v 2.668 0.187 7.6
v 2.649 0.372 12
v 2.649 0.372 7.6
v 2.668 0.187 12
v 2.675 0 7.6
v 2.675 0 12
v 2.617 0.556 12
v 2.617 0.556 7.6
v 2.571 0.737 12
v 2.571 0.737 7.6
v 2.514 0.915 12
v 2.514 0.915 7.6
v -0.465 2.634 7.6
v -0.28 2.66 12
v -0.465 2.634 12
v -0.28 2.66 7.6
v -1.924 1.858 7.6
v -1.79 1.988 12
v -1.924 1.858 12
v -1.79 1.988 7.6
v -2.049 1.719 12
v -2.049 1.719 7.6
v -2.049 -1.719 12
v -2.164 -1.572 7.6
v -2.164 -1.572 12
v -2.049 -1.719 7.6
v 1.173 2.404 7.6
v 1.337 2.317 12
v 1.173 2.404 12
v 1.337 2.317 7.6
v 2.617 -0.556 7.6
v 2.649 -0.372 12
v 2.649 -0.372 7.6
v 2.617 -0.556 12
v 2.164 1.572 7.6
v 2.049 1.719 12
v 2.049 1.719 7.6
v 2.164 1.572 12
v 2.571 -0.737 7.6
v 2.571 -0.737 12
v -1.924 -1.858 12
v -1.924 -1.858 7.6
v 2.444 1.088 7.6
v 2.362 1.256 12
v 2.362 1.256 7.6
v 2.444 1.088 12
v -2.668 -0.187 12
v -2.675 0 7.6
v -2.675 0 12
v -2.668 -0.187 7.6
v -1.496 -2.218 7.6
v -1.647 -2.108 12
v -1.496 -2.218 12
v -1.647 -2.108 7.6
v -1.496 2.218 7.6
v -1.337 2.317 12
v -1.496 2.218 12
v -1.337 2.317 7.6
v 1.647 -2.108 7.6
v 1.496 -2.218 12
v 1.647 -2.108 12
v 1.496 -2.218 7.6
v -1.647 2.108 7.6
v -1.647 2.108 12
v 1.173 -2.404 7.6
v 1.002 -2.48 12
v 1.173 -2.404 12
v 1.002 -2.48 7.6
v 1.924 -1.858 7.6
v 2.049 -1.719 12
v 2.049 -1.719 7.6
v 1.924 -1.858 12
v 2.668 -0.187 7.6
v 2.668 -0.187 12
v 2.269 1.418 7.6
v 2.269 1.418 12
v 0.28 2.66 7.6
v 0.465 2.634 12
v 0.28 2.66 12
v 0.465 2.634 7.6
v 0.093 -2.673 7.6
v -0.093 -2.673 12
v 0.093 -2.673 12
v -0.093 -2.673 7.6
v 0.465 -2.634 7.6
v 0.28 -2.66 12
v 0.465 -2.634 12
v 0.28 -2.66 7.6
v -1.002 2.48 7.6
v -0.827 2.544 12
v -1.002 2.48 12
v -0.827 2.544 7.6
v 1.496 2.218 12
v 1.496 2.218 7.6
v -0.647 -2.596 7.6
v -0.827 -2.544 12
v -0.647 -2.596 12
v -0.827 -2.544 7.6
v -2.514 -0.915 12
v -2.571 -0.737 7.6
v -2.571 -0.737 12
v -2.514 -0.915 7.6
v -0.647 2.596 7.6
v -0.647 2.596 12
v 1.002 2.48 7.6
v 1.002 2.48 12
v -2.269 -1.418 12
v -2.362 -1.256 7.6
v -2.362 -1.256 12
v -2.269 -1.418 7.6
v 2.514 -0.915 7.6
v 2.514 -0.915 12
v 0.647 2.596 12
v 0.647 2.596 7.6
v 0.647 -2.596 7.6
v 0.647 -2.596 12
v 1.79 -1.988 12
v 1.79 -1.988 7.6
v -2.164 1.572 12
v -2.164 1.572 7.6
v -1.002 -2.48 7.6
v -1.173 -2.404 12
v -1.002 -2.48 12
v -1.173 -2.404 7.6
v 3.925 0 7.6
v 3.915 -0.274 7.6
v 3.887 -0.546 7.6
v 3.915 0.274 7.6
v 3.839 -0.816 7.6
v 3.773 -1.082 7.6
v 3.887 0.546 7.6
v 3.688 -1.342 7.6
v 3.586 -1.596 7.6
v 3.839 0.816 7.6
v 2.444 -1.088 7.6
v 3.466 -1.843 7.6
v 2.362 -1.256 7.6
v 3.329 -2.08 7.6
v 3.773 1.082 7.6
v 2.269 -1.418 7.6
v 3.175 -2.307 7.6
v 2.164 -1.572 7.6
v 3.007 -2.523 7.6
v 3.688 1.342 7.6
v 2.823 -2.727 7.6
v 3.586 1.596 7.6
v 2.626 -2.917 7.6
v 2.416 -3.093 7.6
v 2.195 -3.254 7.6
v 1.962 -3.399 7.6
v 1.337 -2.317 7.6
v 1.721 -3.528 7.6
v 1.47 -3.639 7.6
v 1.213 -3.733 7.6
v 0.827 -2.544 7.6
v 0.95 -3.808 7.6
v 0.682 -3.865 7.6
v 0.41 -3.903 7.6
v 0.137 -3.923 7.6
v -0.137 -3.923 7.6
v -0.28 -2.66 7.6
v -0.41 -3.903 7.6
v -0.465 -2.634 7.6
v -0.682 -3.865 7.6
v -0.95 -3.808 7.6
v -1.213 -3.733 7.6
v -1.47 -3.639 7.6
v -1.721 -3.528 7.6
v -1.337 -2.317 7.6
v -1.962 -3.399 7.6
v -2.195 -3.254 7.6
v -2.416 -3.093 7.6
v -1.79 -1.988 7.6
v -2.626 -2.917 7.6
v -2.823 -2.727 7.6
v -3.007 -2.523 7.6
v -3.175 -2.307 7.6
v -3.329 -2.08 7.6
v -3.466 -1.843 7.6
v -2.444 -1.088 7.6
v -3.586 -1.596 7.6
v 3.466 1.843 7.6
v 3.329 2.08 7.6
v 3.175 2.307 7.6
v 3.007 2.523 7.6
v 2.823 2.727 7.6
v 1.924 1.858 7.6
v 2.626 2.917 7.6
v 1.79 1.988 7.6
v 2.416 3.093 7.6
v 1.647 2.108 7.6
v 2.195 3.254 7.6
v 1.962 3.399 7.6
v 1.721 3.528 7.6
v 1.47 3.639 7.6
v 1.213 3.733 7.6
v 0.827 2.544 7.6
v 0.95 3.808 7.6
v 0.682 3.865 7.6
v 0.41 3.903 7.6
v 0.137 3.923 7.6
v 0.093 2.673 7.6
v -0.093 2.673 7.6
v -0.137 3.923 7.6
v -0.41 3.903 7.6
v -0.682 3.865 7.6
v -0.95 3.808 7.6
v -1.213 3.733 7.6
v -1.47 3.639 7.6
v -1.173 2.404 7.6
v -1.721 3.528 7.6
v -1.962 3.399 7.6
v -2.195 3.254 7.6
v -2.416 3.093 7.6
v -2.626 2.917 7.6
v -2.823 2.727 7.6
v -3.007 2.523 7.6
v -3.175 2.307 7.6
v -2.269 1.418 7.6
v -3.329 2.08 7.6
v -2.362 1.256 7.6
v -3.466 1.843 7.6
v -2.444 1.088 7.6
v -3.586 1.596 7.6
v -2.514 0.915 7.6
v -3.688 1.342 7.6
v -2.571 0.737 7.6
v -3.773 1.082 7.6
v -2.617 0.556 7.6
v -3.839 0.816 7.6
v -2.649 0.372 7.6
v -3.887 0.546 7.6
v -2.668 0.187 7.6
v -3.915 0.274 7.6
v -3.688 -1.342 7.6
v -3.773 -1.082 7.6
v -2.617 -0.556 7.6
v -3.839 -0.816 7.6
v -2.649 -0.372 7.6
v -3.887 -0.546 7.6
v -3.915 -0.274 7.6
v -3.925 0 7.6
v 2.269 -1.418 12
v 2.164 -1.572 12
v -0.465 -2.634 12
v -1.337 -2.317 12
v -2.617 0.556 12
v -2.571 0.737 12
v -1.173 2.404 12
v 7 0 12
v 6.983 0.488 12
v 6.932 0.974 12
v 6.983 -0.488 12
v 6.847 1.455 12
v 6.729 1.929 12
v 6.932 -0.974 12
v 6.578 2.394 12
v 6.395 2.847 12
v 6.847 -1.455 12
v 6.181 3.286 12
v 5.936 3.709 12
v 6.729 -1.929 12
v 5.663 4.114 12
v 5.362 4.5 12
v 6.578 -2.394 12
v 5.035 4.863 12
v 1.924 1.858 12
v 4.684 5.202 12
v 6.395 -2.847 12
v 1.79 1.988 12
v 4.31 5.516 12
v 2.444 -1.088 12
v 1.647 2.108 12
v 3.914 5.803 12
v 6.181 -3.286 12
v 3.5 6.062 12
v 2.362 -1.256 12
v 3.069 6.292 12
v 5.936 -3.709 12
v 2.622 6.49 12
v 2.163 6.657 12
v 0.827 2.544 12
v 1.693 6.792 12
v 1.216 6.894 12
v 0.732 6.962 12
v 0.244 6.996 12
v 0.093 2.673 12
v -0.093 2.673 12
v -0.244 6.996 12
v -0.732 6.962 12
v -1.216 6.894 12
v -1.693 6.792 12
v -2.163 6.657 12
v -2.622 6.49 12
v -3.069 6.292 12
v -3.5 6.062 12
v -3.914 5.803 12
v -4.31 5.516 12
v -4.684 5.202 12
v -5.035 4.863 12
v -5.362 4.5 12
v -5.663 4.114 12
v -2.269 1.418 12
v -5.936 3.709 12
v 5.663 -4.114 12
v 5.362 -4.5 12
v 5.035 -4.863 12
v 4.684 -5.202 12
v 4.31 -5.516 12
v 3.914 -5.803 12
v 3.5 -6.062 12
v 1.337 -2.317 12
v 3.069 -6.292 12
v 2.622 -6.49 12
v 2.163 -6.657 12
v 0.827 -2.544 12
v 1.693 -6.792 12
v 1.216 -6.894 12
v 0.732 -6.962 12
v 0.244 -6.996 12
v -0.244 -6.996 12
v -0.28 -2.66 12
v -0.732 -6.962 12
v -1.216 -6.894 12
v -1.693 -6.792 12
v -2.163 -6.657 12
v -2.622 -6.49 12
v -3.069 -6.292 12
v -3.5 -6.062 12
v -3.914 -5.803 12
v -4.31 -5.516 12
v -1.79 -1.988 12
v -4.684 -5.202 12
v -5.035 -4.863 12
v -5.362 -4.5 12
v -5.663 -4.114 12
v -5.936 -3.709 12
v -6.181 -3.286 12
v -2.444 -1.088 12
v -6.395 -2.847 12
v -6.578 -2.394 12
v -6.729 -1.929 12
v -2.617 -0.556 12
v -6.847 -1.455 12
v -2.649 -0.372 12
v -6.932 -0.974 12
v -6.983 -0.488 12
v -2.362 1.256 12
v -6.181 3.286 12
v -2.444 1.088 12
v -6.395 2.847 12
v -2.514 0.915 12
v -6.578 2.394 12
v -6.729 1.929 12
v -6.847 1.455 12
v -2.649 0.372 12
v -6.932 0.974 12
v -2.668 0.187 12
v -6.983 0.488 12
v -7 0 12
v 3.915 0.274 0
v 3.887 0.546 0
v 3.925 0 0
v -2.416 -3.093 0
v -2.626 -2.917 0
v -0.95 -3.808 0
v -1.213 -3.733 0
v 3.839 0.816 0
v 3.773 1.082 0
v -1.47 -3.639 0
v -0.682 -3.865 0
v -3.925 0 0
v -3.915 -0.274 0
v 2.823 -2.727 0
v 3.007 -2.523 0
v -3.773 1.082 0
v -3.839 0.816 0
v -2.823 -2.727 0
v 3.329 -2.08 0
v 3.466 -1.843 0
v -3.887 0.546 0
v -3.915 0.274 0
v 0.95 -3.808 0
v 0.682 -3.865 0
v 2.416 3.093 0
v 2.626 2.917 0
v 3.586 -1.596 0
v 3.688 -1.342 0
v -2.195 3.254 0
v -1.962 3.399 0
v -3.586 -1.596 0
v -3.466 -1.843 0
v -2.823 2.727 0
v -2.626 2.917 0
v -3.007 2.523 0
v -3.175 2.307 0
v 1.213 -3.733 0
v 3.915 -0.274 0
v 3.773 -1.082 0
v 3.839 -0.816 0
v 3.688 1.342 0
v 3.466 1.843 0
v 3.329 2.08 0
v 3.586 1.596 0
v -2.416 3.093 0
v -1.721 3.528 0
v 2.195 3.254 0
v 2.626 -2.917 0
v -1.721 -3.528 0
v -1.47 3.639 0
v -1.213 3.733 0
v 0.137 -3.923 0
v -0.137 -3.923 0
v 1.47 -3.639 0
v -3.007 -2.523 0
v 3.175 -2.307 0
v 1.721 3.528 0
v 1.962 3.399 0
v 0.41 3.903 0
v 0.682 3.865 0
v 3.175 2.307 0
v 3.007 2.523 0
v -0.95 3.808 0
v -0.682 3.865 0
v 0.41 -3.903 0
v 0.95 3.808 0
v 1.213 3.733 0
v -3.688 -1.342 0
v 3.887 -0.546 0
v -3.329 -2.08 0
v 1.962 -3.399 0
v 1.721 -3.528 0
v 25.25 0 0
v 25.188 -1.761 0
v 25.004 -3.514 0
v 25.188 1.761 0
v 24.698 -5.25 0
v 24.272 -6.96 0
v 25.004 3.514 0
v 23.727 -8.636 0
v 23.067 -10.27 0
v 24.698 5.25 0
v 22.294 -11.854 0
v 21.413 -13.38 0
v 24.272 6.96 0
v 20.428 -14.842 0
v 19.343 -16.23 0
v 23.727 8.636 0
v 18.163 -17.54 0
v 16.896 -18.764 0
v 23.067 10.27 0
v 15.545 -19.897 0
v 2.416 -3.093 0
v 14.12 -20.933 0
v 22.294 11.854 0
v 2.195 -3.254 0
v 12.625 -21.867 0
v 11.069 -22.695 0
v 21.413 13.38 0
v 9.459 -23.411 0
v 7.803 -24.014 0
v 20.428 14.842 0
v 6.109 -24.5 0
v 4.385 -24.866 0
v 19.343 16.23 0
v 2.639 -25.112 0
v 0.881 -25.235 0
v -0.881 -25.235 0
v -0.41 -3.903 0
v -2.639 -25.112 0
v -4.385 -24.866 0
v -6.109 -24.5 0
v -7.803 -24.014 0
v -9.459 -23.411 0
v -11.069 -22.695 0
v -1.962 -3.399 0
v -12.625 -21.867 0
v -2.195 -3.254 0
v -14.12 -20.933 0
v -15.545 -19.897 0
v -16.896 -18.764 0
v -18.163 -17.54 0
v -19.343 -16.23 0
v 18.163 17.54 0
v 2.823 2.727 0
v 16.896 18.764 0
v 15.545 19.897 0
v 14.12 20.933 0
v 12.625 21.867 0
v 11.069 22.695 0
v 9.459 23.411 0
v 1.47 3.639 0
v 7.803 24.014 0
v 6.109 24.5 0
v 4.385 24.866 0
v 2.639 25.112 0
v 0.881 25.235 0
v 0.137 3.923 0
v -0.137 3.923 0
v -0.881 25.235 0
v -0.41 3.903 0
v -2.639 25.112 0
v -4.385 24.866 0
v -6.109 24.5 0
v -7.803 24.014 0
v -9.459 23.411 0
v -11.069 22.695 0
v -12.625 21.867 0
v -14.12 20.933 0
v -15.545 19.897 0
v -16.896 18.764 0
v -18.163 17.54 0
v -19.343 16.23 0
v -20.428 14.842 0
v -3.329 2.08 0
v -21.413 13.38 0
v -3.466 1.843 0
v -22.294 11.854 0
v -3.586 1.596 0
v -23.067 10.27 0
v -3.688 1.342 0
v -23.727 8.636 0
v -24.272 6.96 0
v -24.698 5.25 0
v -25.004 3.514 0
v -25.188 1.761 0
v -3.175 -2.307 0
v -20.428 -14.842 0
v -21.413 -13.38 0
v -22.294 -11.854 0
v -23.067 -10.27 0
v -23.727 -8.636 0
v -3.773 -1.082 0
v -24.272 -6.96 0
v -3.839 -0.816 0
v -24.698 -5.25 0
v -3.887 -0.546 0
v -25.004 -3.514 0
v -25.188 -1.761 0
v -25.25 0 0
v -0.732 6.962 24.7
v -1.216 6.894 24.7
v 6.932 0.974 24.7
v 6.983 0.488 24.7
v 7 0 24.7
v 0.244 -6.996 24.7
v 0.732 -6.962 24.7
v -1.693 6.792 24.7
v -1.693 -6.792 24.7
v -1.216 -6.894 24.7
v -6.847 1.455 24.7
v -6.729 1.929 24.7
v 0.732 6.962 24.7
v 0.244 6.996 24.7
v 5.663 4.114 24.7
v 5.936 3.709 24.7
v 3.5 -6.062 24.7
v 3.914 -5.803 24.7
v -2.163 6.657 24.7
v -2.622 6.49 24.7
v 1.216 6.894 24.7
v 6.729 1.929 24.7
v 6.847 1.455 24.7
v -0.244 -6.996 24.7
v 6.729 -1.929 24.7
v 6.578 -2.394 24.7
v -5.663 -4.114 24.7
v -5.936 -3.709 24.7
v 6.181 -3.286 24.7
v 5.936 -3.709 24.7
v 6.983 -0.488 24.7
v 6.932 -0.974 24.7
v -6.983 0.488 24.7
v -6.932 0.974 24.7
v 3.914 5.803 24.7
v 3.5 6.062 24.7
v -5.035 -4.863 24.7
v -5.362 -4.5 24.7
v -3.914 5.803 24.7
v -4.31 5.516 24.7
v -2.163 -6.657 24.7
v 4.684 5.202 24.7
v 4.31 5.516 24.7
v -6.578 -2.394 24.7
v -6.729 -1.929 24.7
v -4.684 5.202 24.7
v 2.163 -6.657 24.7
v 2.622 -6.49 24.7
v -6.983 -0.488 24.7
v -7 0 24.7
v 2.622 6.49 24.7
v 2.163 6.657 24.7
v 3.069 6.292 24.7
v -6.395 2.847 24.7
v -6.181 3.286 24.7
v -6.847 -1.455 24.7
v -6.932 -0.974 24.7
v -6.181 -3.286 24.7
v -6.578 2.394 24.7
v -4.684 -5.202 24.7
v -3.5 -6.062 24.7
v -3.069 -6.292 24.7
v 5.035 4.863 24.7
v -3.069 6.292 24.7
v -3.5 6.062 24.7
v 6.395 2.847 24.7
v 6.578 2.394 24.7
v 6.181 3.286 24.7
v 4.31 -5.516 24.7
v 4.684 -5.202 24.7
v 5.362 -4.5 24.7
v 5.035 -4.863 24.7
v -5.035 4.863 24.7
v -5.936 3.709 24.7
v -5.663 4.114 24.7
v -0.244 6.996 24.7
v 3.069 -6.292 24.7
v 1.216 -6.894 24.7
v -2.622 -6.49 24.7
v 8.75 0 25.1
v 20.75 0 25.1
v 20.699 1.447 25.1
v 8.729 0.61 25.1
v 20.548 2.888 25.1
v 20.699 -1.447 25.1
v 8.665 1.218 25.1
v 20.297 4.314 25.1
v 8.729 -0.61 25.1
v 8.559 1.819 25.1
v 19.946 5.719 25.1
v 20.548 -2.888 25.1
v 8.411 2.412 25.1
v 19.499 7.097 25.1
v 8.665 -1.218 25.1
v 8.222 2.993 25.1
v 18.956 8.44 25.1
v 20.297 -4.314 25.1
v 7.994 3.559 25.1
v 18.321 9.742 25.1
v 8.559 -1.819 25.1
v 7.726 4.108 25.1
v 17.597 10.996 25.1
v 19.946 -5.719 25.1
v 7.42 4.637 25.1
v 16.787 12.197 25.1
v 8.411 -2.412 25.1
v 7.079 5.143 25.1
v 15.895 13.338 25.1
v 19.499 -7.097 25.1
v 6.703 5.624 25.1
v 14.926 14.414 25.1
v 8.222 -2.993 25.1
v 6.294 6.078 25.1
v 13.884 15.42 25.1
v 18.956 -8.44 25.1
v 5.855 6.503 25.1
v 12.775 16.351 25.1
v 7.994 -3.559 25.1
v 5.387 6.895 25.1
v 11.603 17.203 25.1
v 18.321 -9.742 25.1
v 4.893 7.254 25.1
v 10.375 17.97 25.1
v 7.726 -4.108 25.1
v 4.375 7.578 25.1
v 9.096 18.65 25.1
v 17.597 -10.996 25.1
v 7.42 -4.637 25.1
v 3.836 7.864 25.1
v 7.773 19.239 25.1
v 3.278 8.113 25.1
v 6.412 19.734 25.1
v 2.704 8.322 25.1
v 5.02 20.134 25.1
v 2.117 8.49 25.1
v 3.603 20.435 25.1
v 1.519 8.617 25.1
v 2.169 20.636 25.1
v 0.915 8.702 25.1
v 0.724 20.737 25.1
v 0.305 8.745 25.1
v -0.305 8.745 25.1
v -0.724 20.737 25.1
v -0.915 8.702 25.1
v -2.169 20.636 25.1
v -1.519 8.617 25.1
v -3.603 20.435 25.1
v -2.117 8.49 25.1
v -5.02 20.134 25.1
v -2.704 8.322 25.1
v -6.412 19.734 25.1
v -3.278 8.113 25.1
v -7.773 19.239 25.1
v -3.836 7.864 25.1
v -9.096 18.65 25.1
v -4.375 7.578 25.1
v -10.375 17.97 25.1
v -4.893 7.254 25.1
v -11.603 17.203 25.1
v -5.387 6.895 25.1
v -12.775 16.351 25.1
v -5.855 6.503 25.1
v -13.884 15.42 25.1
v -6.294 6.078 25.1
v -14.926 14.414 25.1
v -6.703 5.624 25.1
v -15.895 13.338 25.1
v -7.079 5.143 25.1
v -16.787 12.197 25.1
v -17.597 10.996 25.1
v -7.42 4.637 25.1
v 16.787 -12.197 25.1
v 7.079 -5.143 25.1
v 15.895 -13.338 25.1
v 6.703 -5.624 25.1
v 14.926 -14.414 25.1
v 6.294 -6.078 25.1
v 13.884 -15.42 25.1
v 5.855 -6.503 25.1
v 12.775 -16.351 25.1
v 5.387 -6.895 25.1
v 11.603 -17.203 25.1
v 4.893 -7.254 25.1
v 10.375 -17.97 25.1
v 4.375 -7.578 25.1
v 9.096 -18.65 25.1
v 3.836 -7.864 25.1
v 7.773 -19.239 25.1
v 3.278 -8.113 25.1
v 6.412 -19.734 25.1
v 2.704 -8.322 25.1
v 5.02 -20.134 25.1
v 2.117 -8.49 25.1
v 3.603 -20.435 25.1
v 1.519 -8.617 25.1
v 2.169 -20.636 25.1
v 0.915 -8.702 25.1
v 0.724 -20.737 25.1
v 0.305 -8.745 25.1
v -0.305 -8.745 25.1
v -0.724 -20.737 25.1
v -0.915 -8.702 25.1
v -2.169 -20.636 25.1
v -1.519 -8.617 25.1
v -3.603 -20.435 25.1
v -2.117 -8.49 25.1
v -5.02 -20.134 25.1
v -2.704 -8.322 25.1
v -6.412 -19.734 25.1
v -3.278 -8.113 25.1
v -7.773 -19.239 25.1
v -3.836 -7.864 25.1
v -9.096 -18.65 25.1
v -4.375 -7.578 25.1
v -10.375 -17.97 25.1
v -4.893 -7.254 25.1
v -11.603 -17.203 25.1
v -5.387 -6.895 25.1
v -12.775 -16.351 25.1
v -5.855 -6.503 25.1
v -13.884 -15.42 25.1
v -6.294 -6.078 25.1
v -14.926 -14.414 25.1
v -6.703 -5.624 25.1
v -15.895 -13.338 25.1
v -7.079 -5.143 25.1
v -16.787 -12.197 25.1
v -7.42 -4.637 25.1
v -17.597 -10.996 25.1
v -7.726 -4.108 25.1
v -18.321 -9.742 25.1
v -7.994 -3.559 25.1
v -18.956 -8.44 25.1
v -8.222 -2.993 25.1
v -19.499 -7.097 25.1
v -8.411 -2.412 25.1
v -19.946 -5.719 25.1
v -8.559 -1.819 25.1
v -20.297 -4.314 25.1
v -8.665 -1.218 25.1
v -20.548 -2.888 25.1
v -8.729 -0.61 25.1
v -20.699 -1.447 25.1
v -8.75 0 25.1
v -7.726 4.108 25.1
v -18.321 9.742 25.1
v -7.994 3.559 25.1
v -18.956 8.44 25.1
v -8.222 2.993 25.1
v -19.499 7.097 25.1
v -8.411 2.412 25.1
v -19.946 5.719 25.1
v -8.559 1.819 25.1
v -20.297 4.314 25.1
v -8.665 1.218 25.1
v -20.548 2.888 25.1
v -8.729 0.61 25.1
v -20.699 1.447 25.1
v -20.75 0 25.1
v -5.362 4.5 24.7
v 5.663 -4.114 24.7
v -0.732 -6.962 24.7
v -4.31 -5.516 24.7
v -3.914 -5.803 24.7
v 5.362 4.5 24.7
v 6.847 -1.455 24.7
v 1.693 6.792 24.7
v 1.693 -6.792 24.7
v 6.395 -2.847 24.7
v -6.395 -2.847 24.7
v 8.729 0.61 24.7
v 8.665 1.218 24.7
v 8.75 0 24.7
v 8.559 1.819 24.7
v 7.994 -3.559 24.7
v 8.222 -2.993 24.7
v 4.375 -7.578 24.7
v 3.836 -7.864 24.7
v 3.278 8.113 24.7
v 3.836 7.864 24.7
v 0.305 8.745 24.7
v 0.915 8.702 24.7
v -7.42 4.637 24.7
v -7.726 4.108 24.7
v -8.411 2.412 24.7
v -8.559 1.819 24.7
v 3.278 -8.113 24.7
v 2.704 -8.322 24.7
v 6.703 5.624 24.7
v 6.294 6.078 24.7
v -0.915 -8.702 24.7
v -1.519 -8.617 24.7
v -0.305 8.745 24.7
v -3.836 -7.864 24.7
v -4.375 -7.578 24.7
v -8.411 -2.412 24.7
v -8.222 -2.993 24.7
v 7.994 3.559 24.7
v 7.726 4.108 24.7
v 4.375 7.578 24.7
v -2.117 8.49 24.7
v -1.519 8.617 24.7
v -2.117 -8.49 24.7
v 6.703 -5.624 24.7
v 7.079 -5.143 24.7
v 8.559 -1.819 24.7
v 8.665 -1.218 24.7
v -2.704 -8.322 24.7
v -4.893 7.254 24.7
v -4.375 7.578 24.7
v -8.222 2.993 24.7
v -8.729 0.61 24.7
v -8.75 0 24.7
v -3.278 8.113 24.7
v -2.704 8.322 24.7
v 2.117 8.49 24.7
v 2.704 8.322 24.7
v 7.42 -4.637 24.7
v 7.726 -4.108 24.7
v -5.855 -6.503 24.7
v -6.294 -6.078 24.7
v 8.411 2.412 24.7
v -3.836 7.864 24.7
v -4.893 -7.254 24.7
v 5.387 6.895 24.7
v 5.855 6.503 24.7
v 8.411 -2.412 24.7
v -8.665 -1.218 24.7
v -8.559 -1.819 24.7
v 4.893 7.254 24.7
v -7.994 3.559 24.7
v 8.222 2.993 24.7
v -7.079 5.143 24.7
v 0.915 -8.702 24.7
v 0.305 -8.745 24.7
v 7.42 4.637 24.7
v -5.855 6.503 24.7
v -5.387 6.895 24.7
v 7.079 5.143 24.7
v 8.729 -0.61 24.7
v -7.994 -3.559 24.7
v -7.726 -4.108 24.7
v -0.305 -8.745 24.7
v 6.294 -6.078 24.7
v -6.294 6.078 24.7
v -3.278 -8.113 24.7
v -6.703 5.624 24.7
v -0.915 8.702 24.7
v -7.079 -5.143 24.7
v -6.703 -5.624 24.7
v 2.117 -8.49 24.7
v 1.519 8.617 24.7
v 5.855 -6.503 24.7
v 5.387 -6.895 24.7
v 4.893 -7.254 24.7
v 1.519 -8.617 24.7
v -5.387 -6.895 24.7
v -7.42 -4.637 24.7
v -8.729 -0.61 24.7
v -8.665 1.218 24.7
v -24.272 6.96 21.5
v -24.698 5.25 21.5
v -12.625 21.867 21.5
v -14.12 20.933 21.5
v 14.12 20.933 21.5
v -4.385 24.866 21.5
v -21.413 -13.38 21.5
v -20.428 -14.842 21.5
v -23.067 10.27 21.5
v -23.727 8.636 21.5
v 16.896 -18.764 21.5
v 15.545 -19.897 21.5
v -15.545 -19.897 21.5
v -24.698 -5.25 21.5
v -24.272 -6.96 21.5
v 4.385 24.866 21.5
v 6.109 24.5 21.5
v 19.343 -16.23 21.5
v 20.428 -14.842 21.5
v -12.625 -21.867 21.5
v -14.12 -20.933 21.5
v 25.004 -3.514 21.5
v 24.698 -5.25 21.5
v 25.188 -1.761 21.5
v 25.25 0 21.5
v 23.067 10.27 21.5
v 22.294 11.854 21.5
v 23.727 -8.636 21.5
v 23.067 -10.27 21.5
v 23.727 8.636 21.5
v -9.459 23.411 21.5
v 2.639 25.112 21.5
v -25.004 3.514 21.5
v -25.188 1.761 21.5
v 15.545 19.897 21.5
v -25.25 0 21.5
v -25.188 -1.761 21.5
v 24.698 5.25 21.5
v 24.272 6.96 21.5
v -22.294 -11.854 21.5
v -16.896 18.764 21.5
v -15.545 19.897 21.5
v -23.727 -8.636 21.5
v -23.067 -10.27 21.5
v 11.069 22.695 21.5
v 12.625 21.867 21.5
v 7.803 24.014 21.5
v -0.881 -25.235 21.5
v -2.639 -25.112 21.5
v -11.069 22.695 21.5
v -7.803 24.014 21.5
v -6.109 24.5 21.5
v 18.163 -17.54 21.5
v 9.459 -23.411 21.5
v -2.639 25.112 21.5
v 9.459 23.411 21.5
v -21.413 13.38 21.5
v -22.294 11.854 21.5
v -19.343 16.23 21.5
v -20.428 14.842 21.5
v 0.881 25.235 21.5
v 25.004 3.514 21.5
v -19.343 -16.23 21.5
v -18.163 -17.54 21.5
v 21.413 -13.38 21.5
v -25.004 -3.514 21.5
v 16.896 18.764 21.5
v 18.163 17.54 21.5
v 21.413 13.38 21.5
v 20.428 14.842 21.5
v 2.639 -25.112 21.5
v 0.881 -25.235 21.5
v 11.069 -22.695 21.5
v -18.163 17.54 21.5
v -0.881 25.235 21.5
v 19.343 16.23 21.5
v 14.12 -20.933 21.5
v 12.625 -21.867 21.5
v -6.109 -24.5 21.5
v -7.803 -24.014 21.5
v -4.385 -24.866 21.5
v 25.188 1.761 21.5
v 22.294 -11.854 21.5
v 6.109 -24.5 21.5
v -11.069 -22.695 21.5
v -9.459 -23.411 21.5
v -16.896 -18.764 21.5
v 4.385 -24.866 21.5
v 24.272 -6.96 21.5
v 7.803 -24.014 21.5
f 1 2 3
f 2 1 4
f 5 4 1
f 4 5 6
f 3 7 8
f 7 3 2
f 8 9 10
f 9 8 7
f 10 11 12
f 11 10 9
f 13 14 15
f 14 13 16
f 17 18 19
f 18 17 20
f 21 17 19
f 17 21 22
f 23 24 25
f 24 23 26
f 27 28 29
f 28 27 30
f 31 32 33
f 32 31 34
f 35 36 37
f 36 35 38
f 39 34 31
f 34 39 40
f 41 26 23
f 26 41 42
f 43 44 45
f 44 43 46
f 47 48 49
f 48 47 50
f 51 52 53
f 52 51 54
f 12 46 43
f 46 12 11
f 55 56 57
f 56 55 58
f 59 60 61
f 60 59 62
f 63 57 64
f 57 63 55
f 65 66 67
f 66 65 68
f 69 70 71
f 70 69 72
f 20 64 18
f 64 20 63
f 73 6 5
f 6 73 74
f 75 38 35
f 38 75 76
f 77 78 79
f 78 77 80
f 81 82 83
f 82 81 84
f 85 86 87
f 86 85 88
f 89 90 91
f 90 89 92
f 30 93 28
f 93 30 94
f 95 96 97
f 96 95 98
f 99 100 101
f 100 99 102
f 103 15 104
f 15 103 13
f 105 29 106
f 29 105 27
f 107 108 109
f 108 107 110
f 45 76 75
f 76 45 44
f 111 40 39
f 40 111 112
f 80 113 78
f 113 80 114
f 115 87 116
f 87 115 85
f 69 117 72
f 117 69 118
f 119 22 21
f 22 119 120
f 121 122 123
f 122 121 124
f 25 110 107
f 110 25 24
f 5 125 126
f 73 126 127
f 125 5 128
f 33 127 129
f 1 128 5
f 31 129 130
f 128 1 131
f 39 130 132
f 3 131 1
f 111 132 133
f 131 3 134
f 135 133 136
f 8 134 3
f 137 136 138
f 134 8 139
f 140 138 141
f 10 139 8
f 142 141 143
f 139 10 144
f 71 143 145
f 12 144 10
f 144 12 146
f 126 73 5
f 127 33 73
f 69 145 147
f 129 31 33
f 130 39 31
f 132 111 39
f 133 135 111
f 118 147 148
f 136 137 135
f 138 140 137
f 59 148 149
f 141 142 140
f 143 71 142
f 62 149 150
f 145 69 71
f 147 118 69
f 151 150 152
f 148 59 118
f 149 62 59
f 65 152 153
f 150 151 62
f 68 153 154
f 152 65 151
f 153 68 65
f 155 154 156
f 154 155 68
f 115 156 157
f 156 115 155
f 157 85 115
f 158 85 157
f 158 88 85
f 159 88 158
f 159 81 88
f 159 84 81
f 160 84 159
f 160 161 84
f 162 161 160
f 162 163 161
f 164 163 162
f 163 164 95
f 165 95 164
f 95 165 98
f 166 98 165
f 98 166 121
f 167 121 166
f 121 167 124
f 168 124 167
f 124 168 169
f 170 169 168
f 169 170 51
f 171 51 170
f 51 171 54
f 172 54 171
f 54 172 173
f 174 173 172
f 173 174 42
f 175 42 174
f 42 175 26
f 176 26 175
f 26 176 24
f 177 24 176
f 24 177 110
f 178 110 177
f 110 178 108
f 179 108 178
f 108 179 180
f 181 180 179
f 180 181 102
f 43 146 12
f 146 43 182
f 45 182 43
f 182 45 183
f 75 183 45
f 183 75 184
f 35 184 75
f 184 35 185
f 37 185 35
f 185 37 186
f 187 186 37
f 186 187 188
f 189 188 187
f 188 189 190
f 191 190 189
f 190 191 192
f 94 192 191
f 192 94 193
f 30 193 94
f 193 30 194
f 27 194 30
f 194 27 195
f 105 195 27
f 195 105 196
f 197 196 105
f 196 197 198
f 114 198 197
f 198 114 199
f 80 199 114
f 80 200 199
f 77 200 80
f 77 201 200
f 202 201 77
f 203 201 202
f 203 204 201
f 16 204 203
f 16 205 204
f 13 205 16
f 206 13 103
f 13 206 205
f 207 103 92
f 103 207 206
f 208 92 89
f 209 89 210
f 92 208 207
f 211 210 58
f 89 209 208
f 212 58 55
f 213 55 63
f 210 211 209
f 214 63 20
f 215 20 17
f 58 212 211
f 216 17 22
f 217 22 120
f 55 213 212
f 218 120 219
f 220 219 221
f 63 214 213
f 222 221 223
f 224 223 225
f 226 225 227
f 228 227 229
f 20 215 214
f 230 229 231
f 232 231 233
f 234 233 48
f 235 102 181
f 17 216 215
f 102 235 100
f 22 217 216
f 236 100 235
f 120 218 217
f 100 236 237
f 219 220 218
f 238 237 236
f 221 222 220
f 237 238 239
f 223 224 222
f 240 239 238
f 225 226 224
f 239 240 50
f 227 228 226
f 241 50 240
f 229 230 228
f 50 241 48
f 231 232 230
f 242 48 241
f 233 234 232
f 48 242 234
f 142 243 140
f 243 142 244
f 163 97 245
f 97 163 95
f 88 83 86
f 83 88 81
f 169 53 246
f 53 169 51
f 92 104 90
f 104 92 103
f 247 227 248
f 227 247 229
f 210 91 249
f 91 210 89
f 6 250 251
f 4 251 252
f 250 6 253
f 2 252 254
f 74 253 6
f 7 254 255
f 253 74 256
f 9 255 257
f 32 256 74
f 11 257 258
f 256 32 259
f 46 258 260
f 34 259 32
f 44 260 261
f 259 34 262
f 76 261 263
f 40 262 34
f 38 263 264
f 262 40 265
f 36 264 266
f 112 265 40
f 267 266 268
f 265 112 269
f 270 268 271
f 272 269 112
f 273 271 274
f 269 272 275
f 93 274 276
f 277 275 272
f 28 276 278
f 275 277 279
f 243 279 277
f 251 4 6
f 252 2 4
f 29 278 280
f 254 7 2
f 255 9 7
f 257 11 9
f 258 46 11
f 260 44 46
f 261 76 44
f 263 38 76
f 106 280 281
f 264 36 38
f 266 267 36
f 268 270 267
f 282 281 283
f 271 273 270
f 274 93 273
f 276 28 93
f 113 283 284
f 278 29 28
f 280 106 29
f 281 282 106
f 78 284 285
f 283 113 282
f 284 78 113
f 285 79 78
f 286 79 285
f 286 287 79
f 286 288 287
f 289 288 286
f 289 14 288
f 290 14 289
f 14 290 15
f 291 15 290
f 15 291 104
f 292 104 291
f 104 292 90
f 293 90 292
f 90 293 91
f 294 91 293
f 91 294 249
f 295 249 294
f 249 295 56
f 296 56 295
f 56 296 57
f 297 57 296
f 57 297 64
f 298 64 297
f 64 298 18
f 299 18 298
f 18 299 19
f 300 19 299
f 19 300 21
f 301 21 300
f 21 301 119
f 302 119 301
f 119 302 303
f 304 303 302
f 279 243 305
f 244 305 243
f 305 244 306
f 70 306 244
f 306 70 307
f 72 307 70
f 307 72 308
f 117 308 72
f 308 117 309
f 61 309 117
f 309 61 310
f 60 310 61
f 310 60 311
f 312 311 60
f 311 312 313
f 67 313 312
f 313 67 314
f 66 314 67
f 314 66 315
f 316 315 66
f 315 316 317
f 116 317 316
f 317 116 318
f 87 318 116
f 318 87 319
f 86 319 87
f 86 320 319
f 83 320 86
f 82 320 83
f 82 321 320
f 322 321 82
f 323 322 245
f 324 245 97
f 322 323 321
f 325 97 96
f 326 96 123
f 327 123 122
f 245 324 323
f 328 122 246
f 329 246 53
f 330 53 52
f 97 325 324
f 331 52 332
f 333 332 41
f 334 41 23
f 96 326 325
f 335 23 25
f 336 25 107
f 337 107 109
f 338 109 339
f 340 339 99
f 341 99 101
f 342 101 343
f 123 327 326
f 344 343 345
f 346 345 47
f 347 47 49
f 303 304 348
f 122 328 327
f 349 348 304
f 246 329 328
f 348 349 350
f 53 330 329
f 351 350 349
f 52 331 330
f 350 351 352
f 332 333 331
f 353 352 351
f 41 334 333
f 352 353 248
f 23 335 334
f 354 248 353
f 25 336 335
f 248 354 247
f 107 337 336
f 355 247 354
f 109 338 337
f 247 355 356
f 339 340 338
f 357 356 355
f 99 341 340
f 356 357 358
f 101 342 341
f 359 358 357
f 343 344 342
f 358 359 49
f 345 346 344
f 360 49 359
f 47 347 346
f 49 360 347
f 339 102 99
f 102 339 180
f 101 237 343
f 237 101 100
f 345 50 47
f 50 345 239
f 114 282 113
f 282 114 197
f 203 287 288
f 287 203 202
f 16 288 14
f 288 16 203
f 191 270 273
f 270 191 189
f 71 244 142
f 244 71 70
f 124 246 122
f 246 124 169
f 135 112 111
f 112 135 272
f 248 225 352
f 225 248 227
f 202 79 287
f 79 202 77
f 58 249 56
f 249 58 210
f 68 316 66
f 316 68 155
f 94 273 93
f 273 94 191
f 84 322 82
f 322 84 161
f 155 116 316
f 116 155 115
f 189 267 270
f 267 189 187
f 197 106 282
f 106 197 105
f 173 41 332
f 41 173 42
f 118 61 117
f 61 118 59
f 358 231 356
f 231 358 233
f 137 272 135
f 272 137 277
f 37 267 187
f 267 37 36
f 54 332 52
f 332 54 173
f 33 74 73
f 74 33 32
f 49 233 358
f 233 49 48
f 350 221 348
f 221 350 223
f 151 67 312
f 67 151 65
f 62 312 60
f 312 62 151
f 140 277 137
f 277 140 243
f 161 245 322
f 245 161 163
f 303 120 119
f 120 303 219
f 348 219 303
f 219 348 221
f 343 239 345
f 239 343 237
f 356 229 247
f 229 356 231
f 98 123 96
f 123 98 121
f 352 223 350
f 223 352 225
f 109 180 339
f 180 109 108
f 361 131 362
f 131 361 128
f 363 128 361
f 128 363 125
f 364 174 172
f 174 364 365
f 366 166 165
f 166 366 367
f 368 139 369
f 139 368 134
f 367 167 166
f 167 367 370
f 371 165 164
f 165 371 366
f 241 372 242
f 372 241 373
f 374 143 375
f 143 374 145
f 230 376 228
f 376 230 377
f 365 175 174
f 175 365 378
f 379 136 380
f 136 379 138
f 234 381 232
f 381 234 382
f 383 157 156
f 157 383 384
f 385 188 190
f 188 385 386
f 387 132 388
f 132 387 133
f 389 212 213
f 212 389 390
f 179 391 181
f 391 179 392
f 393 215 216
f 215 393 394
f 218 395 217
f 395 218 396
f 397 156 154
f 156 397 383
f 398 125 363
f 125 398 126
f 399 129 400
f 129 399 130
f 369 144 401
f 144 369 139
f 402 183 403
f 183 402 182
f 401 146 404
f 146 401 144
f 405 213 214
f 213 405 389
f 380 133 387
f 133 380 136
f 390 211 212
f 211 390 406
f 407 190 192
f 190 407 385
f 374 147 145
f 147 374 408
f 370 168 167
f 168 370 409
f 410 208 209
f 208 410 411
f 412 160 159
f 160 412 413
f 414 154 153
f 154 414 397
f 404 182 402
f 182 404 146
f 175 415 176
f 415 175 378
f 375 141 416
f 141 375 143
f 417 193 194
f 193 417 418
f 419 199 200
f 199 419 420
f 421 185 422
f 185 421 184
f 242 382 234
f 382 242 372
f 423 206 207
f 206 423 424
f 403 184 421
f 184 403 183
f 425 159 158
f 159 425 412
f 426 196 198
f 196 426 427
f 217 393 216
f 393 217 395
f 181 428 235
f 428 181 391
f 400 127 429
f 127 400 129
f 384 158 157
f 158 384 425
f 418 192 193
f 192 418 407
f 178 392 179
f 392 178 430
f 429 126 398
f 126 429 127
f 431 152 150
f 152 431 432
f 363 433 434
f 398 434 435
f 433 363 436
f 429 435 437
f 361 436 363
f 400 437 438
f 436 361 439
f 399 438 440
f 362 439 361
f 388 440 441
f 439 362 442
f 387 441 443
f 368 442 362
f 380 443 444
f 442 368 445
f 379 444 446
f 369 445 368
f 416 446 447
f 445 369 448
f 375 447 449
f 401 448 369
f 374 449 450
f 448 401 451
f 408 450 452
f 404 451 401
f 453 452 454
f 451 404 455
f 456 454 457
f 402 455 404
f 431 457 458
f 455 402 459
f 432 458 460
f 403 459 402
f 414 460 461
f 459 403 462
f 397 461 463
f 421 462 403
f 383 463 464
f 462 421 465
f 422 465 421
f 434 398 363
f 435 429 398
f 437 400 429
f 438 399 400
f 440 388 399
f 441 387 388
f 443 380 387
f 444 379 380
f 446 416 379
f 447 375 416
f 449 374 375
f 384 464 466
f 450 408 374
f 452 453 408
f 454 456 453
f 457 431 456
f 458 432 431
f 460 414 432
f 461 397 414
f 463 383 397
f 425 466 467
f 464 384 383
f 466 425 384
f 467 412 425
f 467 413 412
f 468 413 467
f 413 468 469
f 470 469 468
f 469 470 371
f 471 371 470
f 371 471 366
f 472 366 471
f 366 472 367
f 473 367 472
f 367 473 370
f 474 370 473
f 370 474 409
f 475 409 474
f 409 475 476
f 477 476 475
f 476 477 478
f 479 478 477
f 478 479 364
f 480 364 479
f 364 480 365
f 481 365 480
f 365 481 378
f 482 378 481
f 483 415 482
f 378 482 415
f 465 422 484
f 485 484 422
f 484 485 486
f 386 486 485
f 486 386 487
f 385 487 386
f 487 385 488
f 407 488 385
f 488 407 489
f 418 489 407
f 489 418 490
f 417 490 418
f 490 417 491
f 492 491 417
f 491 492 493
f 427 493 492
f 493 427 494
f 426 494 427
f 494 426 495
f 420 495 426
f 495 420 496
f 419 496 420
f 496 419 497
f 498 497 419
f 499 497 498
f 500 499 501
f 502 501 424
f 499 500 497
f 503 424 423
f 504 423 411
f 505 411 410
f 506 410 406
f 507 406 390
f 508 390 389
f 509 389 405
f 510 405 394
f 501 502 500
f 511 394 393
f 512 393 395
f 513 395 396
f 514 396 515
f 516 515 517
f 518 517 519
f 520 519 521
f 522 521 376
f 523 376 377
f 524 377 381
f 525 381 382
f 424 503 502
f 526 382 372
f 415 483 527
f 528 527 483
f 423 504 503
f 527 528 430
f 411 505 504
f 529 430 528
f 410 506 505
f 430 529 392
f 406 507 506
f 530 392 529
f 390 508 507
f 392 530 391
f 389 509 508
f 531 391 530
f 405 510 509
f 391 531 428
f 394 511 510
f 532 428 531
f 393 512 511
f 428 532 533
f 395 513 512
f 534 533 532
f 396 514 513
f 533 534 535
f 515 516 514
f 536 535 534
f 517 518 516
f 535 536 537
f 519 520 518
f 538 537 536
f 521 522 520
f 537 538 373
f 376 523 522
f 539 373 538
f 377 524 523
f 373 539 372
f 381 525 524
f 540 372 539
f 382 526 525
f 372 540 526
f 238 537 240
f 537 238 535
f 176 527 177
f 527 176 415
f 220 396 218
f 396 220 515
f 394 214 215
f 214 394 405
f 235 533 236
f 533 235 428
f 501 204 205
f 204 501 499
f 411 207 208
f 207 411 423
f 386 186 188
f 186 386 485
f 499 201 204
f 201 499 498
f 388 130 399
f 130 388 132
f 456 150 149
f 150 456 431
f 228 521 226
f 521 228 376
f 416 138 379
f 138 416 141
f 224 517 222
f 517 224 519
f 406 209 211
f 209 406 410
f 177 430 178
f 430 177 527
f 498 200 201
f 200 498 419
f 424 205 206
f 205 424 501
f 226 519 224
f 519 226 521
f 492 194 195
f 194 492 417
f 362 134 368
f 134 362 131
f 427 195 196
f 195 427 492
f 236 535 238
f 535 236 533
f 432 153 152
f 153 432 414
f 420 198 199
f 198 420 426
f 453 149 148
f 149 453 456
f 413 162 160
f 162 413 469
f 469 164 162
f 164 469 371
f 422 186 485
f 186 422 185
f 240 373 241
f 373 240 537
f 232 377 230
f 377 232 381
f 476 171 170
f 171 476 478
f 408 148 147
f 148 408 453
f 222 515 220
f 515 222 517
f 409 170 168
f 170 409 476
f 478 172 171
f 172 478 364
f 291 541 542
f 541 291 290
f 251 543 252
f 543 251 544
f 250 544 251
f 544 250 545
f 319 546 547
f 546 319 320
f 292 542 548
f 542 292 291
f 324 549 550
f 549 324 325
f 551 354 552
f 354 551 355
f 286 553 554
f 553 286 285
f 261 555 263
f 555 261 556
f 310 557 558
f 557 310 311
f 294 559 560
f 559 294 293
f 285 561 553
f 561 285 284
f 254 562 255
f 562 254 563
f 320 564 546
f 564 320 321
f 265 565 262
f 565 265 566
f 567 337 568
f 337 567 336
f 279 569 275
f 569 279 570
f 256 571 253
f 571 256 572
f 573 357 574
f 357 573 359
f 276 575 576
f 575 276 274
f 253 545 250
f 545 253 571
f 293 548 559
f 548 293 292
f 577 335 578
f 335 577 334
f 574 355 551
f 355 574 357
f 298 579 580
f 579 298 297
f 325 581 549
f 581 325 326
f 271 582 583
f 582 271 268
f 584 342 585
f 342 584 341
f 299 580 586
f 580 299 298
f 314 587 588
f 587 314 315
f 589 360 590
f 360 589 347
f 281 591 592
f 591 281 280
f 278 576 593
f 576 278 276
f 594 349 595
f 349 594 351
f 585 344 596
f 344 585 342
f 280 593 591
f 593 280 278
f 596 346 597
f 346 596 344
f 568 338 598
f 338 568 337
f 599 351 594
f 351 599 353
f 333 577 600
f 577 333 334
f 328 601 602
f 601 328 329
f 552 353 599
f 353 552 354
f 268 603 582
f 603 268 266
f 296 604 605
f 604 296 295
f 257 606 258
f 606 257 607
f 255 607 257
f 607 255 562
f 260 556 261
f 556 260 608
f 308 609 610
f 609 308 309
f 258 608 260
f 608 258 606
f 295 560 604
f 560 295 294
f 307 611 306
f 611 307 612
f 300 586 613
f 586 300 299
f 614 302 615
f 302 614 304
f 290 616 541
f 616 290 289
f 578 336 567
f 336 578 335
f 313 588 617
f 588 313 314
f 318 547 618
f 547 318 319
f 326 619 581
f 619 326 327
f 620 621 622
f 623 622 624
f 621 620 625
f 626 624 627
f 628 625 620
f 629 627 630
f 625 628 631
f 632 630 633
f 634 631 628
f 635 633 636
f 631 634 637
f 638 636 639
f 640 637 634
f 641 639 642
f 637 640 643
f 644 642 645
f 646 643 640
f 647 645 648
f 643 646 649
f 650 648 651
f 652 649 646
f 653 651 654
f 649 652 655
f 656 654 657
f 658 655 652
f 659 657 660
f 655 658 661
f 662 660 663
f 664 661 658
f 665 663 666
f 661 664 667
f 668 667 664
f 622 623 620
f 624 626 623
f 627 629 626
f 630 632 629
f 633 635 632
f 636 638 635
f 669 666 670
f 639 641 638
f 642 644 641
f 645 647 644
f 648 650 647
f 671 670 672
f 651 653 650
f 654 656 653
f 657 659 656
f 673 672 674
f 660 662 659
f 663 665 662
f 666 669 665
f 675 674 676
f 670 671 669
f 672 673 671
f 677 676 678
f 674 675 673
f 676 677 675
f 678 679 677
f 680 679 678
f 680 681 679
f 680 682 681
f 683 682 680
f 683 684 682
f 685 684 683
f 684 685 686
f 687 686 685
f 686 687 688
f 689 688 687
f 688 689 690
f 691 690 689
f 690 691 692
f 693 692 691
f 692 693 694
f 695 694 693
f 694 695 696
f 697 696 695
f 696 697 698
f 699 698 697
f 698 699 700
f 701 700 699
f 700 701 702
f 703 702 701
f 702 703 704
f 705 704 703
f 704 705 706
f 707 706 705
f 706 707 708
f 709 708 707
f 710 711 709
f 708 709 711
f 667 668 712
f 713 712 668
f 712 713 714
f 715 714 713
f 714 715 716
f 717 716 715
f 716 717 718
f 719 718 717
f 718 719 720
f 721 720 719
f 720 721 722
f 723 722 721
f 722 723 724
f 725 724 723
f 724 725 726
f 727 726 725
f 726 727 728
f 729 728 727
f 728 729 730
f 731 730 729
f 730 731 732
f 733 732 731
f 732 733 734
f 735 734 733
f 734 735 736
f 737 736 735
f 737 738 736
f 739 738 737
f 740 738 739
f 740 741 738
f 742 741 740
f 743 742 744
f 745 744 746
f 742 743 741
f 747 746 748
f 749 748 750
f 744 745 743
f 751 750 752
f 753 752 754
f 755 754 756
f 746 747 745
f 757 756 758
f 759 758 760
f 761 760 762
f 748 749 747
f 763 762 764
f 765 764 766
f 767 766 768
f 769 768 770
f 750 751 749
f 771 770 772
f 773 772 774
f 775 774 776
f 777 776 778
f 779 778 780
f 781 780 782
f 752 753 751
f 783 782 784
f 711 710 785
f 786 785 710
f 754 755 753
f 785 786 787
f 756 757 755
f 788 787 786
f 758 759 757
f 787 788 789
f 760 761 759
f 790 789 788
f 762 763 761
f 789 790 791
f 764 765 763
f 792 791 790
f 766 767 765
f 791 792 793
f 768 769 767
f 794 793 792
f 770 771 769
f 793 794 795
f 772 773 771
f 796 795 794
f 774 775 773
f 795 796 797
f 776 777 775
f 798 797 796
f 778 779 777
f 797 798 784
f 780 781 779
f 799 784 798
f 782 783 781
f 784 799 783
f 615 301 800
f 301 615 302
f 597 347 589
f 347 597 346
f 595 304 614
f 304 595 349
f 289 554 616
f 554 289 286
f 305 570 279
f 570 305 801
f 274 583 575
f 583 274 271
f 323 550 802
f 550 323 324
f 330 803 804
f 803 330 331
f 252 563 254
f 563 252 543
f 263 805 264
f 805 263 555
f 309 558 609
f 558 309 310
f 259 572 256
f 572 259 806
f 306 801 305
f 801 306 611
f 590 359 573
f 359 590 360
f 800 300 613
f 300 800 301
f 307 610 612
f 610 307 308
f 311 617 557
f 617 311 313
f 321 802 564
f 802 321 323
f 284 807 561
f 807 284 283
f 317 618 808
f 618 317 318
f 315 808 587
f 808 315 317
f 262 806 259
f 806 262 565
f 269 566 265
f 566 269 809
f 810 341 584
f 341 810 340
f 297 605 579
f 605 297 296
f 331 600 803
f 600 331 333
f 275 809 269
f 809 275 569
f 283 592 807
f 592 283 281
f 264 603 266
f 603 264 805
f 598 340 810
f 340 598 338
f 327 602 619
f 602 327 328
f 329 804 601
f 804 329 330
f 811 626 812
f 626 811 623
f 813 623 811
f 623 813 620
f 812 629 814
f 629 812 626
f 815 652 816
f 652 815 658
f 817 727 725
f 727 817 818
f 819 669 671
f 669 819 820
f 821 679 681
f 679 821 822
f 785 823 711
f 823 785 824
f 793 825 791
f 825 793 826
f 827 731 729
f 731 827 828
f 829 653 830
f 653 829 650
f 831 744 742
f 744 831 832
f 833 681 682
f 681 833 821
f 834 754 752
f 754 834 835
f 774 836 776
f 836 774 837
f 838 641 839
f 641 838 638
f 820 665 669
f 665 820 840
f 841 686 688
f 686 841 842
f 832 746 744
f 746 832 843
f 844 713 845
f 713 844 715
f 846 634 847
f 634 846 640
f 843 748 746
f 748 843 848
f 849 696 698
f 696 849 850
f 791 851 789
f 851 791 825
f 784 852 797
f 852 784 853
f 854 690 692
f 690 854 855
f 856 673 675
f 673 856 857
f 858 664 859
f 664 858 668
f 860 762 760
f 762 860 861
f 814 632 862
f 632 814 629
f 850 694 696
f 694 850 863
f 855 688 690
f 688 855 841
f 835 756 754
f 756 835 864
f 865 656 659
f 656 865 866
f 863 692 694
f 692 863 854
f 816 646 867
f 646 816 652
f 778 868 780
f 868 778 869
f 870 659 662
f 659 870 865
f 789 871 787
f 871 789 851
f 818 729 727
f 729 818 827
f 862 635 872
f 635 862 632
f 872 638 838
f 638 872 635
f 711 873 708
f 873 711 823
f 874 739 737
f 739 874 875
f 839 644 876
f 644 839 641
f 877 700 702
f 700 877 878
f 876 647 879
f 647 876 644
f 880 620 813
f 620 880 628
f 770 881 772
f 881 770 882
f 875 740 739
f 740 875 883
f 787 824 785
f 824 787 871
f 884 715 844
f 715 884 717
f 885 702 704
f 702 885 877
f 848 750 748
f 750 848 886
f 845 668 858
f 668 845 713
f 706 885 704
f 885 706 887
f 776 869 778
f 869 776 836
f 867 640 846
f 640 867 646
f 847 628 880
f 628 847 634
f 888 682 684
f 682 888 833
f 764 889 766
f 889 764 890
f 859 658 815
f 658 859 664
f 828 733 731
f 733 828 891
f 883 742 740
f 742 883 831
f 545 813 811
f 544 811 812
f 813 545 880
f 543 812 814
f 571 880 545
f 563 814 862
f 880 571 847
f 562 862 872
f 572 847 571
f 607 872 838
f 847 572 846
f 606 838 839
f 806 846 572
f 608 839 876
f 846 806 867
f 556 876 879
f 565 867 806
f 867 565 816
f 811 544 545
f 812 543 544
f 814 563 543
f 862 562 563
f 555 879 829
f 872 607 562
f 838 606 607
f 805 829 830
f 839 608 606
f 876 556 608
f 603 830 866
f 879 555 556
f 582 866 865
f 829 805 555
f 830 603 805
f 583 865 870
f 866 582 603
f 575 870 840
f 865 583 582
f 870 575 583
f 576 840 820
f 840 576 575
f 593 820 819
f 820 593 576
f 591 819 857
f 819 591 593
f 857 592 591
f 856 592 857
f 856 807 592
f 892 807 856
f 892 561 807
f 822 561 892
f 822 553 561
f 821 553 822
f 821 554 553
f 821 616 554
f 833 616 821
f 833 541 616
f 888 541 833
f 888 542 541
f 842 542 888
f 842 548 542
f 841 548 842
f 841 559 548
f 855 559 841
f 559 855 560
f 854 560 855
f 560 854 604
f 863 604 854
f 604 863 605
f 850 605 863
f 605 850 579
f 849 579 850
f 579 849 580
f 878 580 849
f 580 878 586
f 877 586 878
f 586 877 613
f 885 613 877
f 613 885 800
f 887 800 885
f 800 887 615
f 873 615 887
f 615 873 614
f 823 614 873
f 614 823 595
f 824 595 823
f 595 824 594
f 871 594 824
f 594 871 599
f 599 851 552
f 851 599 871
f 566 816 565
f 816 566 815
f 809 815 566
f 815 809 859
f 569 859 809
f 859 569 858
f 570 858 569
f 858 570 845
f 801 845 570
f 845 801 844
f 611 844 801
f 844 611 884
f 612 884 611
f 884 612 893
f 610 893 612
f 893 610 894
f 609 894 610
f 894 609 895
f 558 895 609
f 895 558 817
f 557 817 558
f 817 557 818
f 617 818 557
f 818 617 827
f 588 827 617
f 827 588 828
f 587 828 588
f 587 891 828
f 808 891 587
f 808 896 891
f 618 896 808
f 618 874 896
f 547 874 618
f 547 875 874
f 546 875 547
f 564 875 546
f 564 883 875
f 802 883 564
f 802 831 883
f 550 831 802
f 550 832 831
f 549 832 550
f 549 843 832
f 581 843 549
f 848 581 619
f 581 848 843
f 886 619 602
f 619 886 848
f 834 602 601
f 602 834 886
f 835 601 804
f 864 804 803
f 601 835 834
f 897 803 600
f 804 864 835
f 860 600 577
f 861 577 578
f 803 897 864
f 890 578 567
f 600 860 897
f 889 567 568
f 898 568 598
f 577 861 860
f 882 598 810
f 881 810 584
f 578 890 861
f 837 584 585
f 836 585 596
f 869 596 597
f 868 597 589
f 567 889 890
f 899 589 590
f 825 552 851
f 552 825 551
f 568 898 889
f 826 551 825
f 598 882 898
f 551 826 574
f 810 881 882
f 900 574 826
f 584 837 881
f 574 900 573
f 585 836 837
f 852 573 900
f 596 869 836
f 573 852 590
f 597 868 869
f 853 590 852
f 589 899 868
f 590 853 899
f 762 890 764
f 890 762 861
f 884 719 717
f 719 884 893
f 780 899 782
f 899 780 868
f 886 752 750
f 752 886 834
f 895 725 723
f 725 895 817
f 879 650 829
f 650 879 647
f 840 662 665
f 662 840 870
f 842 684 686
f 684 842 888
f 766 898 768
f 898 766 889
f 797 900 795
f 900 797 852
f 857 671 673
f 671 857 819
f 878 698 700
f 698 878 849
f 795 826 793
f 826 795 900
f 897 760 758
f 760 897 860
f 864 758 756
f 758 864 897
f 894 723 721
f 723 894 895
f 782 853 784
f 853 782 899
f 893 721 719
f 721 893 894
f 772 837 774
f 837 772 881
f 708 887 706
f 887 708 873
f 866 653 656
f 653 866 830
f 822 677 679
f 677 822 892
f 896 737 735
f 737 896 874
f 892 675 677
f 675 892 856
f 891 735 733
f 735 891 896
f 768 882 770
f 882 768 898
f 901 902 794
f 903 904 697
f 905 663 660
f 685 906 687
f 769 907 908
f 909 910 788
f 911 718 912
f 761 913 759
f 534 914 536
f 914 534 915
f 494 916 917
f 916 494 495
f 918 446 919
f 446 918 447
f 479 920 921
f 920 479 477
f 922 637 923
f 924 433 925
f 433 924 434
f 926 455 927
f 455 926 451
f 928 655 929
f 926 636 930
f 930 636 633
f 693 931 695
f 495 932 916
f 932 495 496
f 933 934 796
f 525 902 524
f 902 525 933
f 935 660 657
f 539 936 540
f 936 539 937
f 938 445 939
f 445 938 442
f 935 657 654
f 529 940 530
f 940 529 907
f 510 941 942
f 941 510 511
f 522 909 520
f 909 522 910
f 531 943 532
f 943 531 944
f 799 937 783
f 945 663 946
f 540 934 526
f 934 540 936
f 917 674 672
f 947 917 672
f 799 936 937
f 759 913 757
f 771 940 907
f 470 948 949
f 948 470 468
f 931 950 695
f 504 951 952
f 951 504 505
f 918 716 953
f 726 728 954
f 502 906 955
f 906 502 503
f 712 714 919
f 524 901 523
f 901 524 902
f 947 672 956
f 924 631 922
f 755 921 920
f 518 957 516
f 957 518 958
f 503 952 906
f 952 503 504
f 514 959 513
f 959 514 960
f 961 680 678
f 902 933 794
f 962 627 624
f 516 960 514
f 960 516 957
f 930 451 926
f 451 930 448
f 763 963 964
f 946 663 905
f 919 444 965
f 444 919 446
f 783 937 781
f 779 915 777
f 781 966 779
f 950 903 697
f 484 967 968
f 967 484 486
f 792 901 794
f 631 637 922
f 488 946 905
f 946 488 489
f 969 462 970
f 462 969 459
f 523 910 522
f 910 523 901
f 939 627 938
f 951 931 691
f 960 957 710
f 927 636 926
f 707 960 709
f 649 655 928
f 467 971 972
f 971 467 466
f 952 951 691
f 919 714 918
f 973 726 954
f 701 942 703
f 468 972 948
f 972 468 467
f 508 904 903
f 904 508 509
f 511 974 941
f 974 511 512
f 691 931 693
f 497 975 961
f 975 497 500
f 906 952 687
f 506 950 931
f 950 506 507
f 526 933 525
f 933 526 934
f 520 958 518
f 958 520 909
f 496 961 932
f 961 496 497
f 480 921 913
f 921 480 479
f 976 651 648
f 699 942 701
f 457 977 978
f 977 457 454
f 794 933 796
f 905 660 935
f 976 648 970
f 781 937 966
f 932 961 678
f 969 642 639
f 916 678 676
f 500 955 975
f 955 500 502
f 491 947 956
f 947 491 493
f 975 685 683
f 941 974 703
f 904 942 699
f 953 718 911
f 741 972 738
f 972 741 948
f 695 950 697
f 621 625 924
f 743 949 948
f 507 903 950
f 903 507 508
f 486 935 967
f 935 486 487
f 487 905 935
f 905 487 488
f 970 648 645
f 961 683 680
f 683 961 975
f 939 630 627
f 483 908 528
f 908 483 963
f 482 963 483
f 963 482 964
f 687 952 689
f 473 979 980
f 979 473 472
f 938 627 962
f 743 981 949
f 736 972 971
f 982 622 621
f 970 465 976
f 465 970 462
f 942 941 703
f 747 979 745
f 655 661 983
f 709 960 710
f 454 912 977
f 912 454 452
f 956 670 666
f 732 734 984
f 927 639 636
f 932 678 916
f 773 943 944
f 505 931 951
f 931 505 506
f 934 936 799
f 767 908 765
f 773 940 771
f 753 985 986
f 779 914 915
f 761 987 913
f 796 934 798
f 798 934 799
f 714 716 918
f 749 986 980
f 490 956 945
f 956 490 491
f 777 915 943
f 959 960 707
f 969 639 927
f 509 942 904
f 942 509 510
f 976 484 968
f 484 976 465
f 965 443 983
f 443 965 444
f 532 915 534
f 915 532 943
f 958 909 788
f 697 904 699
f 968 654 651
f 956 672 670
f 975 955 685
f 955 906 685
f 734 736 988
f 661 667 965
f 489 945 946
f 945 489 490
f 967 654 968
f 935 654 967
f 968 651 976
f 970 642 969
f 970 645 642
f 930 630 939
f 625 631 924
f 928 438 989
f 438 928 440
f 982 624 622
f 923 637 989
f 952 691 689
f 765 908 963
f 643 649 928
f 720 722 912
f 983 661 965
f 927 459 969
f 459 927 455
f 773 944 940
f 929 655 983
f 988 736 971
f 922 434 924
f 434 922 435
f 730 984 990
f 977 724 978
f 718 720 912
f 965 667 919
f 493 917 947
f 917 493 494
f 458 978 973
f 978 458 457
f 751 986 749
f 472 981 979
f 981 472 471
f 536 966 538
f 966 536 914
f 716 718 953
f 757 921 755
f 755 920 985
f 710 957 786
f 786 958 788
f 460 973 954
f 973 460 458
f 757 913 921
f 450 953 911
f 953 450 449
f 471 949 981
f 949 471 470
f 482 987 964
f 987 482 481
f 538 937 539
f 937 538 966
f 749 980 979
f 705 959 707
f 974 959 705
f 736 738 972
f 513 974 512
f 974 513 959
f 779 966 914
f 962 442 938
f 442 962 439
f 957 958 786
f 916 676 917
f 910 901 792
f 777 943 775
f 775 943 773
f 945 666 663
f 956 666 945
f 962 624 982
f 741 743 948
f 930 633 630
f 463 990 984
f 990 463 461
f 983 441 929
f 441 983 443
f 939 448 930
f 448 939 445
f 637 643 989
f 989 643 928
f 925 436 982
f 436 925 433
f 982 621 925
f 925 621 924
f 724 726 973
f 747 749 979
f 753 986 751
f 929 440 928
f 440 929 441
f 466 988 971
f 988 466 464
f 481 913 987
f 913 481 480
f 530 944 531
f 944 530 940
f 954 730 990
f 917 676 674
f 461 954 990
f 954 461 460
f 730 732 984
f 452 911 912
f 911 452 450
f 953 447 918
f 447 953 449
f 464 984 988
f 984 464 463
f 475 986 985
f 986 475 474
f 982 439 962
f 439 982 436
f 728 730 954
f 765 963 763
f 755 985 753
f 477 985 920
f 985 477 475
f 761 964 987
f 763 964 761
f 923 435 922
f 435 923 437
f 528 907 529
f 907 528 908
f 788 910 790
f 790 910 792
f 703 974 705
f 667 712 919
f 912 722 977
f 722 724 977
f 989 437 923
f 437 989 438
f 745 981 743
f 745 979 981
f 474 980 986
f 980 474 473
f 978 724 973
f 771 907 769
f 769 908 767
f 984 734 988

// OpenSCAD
$fn=90;
//Gesamte Höhe Schraubenhalter
ghs=12;
//Obere Höhe Schraubenhalter
ohs=4.4;
//Untere Höhe Schraubenhalter
uhs=ghs-ohs;
//Oberer Schraubenhalter Durchmesser
osd=5.35;
//Unterer Schraubenhalter Durchmesser
usd=7.85;
//Durchmesser Fuß
df=50.5;
//Durchmesser Standfläche
ds=41.5;
//Höhe Fuß Total
hft=25.1;
//Höhe Fuß bis Standfläche Rundung
hfs=21.5;
//Oberes Loch Durchmesser, Öffnung Schraube in Fuß Durchmesser
old=14;
//Versatz oberes Loch
vol=0.4;
//durchmesser ring oberes loch
drol=17.5;

//Das ist die grobe Hülle von dem ganzen Fuß, ohne Rundungen, ohne alles, als Kontrolle
//cylinder(h=hft, d=df);


//So jetzt der Fuß mit einer abgerundeten Standfläche
module rounderfoot()
{
hull() {
cylinder(h=hfs, d=df);

translate([0,0,hfs])
cylinder(h=hft-hfs, d=ds);
}
}

module bohrung()
{
//Jetzt die drei Löcher durchbohren, dünn, mittel, dick, ganz dick (ring oben)
//dünn (ist aber weiter oben)
translate([0,0,uhs])
cylinder(h=ohs,d=osd);

//mittel
translate([0,0,0])
cylinder(h=uhs,d=usd);

//dick
translate([0,0,ohs+uhs])
cylinder(h=hft-ohs-uhs,d=old);

//ring
translate([0,0,hft-vol])
cylinder(h=vol,d=drol);
}

difference()
{
    rounderfoot();
    bohrung();
}
